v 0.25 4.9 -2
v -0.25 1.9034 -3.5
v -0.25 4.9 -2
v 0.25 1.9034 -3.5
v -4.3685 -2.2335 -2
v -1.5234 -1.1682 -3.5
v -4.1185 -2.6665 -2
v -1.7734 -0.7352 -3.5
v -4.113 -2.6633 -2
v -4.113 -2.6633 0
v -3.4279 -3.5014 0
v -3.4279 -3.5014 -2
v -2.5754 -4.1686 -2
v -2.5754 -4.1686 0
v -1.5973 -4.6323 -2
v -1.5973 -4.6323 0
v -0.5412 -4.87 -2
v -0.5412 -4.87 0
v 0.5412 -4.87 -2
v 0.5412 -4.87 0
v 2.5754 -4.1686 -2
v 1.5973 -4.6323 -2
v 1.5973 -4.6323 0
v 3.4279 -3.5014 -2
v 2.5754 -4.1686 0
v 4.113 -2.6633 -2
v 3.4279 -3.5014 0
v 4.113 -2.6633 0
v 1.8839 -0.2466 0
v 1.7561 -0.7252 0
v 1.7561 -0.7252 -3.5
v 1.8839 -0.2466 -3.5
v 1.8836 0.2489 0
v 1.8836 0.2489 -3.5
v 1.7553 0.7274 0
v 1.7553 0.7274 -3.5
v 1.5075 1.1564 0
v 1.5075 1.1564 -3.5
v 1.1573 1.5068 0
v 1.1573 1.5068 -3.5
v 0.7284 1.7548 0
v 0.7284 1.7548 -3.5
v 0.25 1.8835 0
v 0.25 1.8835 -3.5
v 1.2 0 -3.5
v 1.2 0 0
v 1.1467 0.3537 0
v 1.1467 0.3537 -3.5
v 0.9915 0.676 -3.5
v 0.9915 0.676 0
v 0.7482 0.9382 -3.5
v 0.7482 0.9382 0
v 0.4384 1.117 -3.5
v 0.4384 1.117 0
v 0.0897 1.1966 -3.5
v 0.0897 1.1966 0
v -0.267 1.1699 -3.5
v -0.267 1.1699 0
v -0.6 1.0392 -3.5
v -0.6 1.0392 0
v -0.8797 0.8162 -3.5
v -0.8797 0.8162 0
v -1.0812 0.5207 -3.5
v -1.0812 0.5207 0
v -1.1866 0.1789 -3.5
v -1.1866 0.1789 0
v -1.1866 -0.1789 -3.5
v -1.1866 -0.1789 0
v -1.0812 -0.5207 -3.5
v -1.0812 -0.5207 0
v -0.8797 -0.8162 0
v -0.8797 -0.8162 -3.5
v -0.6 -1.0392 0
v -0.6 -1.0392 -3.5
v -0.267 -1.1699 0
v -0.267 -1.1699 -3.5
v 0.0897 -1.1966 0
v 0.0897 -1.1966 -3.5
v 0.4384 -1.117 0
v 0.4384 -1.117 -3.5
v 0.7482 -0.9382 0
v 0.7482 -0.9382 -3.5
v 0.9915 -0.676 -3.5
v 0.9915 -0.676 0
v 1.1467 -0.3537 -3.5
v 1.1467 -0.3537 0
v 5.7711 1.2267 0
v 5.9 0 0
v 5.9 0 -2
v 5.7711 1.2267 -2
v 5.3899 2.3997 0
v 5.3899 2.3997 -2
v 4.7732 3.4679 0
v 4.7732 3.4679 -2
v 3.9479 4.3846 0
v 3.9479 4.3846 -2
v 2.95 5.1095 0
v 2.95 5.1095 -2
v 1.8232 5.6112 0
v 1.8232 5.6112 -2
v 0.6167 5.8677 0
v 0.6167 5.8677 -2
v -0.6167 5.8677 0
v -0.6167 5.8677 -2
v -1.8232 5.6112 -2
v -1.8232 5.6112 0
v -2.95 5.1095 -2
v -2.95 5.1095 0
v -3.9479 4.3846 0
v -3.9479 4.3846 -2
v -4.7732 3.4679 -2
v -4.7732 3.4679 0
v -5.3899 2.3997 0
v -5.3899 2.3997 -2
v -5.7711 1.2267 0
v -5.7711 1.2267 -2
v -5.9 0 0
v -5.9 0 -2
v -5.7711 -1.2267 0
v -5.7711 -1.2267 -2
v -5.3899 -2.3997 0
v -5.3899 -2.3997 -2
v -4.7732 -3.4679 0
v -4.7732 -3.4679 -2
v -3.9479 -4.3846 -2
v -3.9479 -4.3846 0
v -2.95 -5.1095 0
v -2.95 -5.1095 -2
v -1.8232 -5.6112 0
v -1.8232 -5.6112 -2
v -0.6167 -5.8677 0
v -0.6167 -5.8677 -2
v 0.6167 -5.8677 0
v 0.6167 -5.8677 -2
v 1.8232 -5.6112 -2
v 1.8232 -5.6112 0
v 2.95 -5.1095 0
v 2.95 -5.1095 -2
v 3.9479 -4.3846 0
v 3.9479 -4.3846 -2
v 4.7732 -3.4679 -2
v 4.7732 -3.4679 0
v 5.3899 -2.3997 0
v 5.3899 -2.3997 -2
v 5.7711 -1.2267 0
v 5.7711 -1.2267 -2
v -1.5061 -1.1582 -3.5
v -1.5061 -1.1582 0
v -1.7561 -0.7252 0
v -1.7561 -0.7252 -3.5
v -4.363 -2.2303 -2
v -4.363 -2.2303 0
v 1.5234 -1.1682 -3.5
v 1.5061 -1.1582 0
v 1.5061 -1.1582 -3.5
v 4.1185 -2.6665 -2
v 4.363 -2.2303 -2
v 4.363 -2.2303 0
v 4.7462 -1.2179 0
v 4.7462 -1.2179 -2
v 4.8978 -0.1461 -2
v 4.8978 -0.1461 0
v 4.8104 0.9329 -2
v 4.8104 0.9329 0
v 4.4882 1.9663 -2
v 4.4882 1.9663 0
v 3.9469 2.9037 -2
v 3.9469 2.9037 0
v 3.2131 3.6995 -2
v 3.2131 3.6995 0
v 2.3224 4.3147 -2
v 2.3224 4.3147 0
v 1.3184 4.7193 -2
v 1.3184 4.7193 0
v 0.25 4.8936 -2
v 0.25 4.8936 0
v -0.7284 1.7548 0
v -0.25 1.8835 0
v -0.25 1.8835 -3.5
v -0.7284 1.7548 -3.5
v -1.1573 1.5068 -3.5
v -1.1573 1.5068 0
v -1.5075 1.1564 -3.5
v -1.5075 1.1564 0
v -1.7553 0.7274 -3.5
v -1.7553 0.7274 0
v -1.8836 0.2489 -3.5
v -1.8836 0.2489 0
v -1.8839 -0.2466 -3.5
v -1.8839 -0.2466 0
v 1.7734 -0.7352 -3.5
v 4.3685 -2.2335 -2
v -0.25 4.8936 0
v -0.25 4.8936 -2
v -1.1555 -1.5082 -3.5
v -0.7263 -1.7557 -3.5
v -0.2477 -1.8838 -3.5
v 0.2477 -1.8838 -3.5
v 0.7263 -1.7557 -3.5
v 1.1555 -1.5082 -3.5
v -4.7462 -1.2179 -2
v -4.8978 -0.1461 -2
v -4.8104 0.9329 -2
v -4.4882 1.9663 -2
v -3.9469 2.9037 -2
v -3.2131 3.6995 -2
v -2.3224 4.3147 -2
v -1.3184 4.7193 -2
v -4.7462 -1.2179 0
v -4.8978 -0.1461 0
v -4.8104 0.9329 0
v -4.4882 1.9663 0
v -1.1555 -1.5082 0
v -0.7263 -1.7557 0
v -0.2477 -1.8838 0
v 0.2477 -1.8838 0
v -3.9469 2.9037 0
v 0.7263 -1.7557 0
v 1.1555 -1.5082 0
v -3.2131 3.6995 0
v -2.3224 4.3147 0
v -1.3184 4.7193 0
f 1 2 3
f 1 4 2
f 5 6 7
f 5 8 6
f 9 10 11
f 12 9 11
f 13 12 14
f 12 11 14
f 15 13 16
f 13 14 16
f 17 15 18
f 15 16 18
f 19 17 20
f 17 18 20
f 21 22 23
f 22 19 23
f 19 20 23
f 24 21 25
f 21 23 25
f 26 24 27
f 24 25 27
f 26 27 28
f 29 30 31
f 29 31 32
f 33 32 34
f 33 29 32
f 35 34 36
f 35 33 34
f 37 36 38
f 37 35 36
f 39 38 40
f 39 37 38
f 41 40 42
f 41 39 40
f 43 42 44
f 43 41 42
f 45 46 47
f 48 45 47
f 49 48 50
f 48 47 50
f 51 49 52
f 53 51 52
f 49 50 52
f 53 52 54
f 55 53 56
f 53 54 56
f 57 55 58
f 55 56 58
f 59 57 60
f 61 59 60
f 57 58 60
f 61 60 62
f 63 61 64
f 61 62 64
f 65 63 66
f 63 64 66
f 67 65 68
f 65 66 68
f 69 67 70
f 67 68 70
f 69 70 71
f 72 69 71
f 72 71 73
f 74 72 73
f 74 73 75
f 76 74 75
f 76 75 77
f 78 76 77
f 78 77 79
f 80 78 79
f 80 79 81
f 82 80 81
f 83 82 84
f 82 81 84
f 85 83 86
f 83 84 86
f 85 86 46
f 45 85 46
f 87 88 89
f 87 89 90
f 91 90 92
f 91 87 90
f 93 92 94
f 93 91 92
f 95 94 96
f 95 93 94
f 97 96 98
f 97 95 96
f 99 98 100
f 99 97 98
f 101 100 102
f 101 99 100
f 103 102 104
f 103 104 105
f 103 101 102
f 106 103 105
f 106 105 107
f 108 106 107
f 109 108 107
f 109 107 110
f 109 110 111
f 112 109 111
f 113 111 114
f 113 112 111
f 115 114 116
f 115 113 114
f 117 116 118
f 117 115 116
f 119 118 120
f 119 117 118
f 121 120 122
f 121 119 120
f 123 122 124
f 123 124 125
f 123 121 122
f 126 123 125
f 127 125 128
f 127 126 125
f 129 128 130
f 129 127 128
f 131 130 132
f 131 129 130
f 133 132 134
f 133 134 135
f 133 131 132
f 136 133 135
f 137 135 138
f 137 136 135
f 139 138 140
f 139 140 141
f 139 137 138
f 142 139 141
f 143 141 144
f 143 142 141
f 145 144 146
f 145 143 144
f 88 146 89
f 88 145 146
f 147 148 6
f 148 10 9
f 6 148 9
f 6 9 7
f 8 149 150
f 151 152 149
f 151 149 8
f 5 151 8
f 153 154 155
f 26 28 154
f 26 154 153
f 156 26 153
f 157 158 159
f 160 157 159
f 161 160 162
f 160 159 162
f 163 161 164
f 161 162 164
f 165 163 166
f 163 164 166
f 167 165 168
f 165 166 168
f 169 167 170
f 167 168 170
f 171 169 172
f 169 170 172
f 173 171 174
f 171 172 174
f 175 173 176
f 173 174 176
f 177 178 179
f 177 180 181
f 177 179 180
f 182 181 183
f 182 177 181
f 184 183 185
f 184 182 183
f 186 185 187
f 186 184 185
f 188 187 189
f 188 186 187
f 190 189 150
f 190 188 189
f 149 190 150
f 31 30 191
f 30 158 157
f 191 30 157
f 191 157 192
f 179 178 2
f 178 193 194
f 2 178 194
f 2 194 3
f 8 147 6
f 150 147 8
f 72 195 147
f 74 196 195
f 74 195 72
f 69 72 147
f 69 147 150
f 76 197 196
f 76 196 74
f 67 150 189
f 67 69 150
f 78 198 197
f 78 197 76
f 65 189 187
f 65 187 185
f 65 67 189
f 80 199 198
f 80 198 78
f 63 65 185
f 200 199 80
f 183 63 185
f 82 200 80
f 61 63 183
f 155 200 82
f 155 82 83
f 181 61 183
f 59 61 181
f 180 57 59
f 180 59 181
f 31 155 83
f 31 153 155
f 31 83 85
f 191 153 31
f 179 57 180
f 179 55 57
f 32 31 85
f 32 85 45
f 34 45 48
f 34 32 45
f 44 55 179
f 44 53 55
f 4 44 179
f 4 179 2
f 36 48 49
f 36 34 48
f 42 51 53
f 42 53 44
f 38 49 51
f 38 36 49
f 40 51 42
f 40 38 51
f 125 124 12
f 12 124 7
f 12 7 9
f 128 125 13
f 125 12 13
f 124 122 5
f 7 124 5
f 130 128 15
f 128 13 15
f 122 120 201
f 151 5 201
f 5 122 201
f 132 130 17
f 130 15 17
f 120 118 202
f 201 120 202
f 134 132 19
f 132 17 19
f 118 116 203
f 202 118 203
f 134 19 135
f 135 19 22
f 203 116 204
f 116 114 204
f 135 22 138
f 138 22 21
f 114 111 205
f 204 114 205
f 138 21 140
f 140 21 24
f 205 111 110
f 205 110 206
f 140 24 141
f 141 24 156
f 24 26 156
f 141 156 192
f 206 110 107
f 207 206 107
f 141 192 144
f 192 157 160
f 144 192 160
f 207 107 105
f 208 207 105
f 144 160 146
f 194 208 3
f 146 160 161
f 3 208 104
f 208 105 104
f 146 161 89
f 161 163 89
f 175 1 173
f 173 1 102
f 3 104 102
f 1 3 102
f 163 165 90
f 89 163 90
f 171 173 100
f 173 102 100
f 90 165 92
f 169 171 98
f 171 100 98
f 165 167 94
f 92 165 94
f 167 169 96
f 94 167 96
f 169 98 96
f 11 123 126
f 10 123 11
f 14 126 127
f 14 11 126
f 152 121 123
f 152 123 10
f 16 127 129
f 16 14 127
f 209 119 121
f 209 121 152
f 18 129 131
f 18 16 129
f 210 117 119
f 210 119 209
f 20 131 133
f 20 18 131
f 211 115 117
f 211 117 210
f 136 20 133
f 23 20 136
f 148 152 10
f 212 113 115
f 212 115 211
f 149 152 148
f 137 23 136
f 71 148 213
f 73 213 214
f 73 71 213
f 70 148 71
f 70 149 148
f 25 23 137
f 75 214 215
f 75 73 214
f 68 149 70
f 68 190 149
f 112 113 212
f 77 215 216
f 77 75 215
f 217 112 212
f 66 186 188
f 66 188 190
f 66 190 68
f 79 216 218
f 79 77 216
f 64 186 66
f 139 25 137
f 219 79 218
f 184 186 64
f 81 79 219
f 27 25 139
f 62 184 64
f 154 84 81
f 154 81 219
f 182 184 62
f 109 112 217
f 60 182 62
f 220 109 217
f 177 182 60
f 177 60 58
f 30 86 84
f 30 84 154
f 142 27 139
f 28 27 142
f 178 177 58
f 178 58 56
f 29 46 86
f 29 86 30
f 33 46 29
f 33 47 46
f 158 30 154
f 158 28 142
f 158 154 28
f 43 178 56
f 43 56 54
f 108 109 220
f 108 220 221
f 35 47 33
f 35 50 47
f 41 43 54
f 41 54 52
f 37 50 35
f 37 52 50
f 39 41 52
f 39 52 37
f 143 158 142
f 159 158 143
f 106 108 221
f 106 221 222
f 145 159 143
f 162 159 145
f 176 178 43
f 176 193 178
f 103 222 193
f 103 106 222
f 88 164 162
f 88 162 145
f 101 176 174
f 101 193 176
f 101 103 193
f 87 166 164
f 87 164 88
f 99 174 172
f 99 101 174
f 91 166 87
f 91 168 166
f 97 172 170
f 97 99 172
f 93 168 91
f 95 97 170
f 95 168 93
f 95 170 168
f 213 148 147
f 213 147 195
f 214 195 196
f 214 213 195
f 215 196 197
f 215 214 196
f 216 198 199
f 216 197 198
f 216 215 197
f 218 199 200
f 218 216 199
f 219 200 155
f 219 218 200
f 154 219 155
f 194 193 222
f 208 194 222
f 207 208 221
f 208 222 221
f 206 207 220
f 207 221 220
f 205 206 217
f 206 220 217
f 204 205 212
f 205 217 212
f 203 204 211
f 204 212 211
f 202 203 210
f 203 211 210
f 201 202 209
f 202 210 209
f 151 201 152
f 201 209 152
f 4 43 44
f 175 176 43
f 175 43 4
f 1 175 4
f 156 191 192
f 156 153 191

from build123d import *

# Parameters (mm, degrees)
SKETCH3_R           = 1.9
SKETCH3_R_2         = 1.2
BOSS_EXTRUDE4_DEPTH = 3.5
SKETCH3_3_R         = 5.9
SKETCH3_3_R_2       = 4.9
BOSS_EXTRUDE5_DEPTH = 2
BOSS_EXTRUDE6_DEPTH = 0.25
CIRPATTERN1_COUNT   = 3


with BuildPart() as part:
    # Sketch3 → Boss-Extrude4 (new body)
    with BuildSketch(Plane.XY):
        Circle(SKETCH3_R)
        Circle(SKETCH3_R_2, mode=Mode.SUBTRACT)
    extrude(amount=-BOSS_EXTRUDE4_DEPTH)



with BuildPart() as body_2:
    # Sketch3<3> → Boss-Extrude5 (new body)
    with BuildSketch(Plane.XY):
        Circle(SKETCH3_3_R)
        Circle(SKETCH3_3_R_2, mode=Mode.SUBTRACT)
    extrude(amount=-BOSS_EXTRUDE5_DEPTH)


with BuildPart() as part_1:
    add(part.part)

    add(body_2.part)  # Boss-Extrude6 merges body 2
    # Sketch5 → Boss-Extrude6 (add, symmetric)
    with BuildSketch(Plane(origin=(0, 0, 0), x_dir=(0, 0, -1), z_dir=(1, 0, 0))):
        Polygon((0, 4.9), (0, 1.903401583), (0, 1.703401583), (3.5, 1.703401583), (3.5, 1.903401583), (2, 4.9), align=None)
    boss_extrude6 = extrude(amount=BOSS_EXTRUDE6_DEPTH, both=True)

    # CirPattern1: Boss-Extrude6 ×3 about axis
    cirpattern1_axis = Axis((0, 0, 0), (0, 0, 1))
    for i in range(1, CIRPATTERN1_COUNT):
        add(boss_extrude6.rotate(cirpattern1_axis, i * 360 / CIRPATTERN1_COUNT))


solid = part_1.part
